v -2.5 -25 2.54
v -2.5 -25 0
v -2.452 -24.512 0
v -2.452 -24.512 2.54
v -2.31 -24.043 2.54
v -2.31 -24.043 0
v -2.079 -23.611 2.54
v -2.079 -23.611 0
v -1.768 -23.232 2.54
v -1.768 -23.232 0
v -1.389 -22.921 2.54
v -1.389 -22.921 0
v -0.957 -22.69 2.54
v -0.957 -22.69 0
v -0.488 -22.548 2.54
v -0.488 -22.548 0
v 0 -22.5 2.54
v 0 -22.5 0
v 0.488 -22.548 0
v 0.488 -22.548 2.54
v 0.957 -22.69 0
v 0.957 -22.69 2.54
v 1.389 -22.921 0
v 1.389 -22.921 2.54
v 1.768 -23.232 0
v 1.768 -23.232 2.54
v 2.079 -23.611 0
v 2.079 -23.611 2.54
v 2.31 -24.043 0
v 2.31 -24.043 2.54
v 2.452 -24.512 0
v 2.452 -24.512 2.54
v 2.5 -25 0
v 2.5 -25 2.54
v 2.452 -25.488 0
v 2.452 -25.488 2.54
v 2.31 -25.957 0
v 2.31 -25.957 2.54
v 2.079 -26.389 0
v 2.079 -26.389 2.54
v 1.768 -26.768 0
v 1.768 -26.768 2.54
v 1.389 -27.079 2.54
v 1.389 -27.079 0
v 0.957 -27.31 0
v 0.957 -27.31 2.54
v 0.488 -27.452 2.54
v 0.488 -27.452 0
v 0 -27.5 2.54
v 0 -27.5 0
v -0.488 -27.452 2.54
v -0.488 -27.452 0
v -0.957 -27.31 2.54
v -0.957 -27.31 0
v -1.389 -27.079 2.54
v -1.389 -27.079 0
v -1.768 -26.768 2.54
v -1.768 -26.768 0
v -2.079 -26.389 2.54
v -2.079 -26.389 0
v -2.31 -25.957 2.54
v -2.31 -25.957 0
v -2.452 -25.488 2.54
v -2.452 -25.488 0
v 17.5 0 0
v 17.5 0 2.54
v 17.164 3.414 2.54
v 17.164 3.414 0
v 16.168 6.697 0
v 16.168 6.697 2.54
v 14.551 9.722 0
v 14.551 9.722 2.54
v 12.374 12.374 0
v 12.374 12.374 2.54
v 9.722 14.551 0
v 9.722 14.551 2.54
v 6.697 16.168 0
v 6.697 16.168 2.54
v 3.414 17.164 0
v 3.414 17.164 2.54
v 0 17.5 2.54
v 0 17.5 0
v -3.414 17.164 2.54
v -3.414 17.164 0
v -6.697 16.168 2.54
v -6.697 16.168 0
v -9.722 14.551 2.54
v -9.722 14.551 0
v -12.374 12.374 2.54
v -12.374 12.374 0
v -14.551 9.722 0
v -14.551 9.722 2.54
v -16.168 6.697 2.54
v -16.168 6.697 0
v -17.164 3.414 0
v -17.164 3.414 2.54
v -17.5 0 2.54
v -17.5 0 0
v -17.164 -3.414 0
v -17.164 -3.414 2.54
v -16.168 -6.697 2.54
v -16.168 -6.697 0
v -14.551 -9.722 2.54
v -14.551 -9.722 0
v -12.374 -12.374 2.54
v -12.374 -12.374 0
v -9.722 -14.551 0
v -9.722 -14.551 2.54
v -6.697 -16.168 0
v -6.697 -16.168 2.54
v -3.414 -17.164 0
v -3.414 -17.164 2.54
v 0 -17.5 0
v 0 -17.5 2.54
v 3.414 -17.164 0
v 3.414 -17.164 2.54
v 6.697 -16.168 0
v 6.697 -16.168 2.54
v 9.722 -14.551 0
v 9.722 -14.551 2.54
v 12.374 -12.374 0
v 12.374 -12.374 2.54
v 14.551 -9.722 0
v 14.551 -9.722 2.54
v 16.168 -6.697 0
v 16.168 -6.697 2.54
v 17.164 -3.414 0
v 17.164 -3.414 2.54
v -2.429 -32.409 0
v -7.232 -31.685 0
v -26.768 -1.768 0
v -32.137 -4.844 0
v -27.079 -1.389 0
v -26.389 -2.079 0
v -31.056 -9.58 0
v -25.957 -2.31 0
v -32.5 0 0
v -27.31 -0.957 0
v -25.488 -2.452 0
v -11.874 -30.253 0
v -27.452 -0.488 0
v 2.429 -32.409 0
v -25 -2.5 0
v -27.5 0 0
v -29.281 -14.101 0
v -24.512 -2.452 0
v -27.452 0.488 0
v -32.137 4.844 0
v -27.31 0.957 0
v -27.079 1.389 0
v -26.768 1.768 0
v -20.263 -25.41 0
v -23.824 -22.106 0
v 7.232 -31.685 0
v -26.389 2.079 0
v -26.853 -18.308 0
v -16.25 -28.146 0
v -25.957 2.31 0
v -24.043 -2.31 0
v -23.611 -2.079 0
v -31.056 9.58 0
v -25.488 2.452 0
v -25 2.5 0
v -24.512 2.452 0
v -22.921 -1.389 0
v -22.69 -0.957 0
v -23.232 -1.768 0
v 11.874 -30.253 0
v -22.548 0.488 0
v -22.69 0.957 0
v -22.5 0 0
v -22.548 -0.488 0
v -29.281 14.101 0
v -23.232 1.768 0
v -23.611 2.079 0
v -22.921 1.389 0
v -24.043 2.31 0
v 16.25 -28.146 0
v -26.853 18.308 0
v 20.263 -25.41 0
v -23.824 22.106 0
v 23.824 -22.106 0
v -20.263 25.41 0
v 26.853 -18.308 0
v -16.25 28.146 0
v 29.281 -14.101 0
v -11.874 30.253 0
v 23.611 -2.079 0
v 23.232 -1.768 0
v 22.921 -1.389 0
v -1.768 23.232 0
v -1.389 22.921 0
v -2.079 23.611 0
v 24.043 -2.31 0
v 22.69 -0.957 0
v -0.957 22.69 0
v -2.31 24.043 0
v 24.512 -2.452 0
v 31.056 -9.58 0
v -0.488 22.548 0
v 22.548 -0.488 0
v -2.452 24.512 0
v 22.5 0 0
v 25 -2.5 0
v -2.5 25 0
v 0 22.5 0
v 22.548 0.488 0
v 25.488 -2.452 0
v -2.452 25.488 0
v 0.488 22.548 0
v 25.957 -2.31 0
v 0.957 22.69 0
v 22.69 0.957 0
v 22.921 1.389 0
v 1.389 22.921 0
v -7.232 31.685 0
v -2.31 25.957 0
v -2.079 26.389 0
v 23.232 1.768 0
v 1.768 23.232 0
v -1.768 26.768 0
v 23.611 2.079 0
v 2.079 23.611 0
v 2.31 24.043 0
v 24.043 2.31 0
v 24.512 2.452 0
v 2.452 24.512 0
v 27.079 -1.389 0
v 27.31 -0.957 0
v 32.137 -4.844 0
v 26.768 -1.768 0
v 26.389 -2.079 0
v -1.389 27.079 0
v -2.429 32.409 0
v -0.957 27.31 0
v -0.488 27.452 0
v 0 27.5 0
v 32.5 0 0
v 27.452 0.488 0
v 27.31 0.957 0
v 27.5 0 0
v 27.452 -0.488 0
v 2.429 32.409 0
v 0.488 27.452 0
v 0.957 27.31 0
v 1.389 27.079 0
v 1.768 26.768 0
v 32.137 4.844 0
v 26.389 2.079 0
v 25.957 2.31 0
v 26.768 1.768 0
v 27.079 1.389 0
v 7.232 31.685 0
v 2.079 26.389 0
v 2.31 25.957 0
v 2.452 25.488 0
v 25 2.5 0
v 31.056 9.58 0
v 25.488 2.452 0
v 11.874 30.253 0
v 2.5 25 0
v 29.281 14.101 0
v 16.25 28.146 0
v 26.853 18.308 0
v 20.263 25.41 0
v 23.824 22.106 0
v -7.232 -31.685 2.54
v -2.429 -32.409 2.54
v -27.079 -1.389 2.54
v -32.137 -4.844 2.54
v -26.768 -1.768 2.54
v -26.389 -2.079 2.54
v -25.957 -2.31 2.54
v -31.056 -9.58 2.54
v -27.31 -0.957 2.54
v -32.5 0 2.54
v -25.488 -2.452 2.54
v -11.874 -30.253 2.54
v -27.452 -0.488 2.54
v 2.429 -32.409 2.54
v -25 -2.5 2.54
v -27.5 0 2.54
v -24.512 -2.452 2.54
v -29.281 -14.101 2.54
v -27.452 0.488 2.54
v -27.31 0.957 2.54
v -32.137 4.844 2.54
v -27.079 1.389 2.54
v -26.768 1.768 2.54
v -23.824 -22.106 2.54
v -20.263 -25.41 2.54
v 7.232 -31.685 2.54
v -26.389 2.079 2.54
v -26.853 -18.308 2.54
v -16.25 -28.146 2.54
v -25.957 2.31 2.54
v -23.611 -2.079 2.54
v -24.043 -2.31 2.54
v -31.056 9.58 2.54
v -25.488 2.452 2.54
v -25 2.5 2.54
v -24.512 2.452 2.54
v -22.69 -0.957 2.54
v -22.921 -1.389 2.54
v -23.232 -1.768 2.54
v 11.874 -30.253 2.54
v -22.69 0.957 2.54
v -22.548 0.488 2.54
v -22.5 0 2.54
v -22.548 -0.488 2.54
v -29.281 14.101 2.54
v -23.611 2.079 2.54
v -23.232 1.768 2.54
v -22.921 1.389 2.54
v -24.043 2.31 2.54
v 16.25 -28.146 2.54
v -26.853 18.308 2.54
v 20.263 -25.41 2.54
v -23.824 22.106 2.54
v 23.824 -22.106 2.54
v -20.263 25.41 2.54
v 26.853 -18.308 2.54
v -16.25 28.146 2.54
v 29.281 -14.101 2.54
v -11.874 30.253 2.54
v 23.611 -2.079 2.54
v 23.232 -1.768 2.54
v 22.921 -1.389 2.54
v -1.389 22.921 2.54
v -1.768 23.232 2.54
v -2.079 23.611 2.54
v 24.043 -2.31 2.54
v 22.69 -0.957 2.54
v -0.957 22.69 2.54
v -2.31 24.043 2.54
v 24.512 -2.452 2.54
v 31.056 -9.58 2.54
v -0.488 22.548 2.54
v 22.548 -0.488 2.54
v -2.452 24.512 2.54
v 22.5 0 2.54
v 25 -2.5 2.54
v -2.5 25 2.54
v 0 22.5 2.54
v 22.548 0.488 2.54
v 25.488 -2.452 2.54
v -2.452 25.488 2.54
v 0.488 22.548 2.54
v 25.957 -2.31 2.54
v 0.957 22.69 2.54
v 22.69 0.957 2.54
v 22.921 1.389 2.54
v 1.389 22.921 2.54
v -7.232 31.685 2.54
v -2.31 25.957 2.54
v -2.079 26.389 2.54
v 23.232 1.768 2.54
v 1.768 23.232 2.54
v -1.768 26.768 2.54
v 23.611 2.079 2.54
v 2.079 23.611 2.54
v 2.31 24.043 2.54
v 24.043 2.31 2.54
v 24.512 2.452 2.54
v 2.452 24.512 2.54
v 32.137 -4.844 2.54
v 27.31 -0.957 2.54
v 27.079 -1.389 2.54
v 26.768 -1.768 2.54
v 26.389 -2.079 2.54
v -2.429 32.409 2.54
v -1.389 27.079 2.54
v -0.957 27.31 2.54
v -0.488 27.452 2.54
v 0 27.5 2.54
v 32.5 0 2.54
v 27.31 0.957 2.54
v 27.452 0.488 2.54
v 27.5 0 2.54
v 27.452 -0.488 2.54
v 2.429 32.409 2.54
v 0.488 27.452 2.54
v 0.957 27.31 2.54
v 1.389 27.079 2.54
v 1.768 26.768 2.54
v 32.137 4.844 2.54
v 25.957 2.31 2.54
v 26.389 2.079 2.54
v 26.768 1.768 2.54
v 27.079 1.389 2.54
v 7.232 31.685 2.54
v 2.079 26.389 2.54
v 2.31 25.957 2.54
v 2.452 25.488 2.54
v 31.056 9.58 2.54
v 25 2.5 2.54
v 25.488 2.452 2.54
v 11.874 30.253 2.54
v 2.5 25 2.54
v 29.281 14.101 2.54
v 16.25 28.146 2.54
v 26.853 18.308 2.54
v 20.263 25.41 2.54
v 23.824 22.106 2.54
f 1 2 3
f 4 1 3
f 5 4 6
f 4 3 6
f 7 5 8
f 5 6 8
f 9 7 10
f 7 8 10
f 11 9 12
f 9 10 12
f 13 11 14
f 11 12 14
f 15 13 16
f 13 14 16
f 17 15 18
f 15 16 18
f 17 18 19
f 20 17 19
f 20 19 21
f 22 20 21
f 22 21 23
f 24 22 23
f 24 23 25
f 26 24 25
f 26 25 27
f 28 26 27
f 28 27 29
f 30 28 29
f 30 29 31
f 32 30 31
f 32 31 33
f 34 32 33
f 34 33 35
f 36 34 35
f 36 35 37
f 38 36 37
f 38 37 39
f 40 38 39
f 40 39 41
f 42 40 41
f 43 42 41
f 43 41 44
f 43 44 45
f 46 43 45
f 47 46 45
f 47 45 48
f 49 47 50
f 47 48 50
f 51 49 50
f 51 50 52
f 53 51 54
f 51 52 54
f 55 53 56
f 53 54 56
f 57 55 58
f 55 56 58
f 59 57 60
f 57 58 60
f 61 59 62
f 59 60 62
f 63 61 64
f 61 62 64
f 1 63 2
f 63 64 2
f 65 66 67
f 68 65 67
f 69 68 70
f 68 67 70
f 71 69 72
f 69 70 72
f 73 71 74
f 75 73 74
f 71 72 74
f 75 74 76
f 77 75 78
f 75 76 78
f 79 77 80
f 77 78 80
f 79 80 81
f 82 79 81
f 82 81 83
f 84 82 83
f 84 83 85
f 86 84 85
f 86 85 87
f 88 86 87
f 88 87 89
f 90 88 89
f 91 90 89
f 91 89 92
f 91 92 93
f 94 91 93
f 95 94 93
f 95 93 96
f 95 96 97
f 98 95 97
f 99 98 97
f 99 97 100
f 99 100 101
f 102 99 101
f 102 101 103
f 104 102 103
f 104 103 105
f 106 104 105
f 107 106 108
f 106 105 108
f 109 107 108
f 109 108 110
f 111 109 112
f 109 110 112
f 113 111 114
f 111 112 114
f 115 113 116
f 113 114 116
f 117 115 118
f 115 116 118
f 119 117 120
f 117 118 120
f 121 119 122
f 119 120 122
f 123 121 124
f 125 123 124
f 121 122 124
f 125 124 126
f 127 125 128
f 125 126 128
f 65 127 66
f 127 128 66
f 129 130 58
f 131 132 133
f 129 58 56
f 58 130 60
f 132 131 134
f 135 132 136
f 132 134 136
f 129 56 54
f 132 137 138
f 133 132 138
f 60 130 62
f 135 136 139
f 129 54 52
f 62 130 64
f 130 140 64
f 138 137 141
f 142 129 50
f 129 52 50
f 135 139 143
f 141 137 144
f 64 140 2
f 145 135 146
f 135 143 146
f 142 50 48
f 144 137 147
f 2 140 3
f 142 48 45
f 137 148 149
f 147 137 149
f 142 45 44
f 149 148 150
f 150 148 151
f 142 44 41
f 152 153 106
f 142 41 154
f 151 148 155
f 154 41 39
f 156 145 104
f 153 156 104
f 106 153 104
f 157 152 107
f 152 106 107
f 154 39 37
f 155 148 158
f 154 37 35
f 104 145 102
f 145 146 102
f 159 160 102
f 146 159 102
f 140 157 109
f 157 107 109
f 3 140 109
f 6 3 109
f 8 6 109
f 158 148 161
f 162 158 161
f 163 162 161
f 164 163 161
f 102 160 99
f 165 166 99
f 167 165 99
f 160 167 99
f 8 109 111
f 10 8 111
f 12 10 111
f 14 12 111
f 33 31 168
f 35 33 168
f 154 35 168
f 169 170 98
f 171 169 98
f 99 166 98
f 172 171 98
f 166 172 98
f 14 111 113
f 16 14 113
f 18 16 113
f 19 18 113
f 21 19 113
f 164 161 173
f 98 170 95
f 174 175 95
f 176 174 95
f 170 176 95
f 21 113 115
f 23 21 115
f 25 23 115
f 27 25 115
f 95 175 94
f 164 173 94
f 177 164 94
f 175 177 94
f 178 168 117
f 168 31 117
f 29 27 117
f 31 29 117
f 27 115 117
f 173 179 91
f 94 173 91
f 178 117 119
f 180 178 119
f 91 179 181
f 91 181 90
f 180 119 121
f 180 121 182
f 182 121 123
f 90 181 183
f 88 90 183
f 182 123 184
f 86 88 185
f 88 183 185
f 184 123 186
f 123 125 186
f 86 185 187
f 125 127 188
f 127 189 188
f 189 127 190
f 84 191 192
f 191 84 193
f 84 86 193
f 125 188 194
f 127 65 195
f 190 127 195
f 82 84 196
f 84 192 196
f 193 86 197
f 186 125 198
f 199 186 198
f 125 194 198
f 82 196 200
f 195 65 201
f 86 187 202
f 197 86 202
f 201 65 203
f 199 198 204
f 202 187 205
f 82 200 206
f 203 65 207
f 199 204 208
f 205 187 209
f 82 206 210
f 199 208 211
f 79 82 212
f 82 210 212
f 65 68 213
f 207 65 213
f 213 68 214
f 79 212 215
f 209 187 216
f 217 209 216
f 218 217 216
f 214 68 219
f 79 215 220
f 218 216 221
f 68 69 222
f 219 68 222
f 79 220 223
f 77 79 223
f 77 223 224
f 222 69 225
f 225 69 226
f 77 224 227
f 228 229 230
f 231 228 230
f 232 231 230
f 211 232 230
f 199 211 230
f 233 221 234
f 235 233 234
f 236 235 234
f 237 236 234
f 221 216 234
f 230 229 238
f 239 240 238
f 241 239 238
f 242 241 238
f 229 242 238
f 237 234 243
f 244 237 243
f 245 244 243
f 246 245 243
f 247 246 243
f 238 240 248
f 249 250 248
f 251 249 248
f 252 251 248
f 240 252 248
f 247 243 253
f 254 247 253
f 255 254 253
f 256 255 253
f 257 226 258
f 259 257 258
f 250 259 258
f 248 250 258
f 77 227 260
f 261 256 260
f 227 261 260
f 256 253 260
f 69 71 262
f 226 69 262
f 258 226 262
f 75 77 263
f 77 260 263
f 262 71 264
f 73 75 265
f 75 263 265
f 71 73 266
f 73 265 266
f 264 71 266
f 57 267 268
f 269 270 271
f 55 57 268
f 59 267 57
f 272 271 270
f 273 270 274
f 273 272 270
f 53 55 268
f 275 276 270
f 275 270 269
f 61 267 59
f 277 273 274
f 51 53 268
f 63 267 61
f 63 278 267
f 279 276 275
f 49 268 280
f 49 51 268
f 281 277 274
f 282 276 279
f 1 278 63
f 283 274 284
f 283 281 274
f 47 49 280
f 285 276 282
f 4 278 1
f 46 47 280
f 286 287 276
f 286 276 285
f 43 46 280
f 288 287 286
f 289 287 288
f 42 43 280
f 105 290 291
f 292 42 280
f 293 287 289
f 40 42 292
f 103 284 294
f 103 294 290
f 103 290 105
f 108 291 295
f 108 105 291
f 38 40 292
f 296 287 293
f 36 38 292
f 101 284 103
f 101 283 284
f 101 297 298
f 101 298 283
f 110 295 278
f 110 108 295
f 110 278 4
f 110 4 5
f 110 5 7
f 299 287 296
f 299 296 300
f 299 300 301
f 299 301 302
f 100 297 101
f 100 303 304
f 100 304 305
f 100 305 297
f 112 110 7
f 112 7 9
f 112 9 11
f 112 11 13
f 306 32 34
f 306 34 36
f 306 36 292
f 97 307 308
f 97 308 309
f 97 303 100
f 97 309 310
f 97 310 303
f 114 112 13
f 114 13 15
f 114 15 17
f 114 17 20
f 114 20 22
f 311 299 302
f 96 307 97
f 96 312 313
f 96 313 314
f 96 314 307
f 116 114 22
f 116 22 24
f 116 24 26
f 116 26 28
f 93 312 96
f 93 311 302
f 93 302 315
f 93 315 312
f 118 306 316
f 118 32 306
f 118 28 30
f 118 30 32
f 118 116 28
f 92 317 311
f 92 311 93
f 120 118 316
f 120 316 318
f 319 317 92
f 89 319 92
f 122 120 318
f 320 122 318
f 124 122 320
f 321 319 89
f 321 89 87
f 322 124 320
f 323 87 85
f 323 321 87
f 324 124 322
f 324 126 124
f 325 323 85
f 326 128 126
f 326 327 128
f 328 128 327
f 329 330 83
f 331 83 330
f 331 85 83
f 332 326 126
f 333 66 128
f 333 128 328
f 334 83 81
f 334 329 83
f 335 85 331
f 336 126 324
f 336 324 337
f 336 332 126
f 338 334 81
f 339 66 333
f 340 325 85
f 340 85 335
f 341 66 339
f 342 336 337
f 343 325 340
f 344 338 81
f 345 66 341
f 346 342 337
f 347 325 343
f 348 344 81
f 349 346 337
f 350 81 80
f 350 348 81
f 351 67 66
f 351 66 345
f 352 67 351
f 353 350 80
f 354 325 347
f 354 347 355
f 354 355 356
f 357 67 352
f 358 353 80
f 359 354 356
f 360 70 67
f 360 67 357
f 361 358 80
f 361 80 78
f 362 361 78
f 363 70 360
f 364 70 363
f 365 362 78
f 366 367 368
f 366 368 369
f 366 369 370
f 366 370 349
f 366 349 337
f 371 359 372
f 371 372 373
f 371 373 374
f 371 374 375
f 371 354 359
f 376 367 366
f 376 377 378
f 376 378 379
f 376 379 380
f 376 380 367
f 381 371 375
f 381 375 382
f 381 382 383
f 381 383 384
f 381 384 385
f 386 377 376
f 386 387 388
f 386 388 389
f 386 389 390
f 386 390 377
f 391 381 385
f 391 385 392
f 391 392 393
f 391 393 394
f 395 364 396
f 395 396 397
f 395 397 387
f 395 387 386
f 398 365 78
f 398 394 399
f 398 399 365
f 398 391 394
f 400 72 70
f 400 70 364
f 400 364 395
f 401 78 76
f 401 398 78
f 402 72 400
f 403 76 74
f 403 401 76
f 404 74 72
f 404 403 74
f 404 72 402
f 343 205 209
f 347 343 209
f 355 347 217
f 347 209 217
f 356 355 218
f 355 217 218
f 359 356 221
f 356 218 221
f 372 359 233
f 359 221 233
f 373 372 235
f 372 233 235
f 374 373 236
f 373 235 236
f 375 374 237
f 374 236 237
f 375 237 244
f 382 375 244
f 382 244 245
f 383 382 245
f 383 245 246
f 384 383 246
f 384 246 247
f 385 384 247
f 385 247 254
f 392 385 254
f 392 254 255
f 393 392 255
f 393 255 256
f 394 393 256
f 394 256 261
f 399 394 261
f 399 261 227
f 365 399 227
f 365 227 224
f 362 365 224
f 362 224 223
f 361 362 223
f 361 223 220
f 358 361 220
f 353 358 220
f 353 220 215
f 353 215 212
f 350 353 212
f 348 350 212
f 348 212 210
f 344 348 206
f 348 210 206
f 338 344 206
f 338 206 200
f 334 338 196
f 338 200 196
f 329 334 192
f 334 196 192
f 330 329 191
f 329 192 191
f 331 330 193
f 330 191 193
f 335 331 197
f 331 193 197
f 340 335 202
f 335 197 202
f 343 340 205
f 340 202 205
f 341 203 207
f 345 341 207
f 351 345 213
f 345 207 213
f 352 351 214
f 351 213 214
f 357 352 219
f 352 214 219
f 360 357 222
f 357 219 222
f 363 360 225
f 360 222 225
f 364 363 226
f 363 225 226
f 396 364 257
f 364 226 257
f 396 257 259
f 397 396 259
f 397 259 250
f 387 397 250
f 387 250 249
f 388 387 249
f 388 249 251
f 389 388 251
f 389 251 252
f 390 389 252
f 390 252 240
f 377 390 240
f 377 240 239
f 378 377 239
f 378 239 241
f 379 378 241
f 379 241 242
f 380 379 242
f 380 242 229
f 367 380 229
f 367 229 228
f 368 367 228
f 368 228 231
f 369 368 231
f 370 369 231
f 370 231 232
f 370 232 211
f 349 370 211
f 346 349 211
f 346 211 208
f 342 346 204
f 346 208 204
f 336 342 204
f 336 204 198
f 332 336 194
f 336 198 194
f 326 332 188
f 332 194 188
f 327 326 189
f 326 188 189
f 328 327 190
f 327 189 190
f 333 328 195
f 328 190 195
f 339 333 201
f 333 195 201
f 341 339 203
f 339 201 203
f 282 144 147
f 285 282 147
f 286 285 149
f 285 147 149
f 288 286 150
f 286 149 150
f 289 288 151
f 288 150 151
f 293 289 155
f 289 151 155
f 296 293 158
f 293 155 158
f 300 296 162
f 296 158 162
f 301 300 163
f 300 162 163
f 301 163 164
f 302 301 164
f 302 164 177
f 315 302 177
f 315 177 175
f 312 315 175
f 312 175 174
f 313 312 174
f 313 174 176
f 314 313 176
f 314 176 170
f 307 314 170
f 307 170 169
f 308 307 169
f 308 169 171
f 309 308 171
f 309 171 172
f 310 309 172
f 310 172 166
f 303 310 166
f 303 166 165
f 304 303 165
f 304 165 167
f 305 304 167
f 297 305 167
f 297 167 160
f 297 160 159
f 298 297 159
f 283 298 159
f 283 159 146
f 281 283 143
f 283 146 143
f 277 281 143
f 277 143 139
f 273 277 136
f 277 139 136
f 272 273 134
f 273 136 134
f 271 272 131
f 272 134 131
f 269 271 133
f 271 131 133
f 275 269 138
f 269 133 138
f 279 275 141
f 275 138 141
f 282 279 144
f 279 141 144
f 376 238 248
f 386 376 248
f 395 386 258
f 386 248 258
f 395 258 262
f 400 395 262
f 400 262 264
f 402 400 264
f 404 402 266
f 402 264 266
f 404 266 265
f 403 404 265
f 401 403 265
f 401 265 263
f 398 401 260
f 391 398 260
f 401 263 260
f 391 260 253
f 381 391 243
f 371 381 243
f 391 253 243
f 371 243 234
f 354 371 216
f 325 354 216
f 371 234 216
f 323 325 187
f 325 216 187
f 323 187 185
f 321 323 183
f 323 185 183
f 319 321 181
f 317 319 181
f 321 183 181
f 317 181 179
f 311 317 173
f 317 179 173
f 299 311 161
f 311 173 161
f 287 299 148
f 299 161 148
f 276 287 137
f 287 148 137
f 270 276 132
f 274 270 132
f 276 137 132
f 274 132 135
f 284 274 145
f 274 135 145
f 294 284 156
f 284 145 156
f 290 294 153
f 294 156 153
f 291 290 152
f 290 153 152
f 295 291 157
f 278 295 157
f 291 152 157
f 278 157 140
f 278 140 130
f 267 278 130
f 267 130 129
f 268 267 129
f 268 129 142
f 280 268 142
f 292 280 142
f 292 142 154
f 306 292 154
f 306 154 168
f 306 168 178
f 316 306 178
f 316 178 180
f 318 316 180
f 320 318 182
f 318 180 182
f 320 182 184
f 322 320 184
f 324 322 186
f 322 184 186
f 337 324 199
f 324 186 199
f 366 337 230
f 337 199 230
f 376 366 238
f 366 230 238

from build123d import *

# Parameters (mm, degrees)
F0_R     = 32.5
F1_DEPTH = 2.54
F3_D     = 5
F4_R     = 17.5
F5_DEPTH = 2.541


with BuildPart() as f1:
    # F0 (on Top) → F1 (new body)
    with BuildSketch(Plane.XY):
        Circle(F0_R)
    extrude(amount=F1_DEPTH)

    # F3 (through all)
    with Locations(Plane.XY.offset(2.54)):
        with Locations((25, 0), (-25, 0), (0, -25), (0, 25)):
            Hole(F3_D / 2)

    # F4 (on face) → F5 (cut, through all)
    with BuildSketch(Plane.XY.offset(2.54)):
        Circle(F4_R)
    extrude(amount=-F5_DEPTH, mode=Mode.SUBTRACT)


solid = f1.part
